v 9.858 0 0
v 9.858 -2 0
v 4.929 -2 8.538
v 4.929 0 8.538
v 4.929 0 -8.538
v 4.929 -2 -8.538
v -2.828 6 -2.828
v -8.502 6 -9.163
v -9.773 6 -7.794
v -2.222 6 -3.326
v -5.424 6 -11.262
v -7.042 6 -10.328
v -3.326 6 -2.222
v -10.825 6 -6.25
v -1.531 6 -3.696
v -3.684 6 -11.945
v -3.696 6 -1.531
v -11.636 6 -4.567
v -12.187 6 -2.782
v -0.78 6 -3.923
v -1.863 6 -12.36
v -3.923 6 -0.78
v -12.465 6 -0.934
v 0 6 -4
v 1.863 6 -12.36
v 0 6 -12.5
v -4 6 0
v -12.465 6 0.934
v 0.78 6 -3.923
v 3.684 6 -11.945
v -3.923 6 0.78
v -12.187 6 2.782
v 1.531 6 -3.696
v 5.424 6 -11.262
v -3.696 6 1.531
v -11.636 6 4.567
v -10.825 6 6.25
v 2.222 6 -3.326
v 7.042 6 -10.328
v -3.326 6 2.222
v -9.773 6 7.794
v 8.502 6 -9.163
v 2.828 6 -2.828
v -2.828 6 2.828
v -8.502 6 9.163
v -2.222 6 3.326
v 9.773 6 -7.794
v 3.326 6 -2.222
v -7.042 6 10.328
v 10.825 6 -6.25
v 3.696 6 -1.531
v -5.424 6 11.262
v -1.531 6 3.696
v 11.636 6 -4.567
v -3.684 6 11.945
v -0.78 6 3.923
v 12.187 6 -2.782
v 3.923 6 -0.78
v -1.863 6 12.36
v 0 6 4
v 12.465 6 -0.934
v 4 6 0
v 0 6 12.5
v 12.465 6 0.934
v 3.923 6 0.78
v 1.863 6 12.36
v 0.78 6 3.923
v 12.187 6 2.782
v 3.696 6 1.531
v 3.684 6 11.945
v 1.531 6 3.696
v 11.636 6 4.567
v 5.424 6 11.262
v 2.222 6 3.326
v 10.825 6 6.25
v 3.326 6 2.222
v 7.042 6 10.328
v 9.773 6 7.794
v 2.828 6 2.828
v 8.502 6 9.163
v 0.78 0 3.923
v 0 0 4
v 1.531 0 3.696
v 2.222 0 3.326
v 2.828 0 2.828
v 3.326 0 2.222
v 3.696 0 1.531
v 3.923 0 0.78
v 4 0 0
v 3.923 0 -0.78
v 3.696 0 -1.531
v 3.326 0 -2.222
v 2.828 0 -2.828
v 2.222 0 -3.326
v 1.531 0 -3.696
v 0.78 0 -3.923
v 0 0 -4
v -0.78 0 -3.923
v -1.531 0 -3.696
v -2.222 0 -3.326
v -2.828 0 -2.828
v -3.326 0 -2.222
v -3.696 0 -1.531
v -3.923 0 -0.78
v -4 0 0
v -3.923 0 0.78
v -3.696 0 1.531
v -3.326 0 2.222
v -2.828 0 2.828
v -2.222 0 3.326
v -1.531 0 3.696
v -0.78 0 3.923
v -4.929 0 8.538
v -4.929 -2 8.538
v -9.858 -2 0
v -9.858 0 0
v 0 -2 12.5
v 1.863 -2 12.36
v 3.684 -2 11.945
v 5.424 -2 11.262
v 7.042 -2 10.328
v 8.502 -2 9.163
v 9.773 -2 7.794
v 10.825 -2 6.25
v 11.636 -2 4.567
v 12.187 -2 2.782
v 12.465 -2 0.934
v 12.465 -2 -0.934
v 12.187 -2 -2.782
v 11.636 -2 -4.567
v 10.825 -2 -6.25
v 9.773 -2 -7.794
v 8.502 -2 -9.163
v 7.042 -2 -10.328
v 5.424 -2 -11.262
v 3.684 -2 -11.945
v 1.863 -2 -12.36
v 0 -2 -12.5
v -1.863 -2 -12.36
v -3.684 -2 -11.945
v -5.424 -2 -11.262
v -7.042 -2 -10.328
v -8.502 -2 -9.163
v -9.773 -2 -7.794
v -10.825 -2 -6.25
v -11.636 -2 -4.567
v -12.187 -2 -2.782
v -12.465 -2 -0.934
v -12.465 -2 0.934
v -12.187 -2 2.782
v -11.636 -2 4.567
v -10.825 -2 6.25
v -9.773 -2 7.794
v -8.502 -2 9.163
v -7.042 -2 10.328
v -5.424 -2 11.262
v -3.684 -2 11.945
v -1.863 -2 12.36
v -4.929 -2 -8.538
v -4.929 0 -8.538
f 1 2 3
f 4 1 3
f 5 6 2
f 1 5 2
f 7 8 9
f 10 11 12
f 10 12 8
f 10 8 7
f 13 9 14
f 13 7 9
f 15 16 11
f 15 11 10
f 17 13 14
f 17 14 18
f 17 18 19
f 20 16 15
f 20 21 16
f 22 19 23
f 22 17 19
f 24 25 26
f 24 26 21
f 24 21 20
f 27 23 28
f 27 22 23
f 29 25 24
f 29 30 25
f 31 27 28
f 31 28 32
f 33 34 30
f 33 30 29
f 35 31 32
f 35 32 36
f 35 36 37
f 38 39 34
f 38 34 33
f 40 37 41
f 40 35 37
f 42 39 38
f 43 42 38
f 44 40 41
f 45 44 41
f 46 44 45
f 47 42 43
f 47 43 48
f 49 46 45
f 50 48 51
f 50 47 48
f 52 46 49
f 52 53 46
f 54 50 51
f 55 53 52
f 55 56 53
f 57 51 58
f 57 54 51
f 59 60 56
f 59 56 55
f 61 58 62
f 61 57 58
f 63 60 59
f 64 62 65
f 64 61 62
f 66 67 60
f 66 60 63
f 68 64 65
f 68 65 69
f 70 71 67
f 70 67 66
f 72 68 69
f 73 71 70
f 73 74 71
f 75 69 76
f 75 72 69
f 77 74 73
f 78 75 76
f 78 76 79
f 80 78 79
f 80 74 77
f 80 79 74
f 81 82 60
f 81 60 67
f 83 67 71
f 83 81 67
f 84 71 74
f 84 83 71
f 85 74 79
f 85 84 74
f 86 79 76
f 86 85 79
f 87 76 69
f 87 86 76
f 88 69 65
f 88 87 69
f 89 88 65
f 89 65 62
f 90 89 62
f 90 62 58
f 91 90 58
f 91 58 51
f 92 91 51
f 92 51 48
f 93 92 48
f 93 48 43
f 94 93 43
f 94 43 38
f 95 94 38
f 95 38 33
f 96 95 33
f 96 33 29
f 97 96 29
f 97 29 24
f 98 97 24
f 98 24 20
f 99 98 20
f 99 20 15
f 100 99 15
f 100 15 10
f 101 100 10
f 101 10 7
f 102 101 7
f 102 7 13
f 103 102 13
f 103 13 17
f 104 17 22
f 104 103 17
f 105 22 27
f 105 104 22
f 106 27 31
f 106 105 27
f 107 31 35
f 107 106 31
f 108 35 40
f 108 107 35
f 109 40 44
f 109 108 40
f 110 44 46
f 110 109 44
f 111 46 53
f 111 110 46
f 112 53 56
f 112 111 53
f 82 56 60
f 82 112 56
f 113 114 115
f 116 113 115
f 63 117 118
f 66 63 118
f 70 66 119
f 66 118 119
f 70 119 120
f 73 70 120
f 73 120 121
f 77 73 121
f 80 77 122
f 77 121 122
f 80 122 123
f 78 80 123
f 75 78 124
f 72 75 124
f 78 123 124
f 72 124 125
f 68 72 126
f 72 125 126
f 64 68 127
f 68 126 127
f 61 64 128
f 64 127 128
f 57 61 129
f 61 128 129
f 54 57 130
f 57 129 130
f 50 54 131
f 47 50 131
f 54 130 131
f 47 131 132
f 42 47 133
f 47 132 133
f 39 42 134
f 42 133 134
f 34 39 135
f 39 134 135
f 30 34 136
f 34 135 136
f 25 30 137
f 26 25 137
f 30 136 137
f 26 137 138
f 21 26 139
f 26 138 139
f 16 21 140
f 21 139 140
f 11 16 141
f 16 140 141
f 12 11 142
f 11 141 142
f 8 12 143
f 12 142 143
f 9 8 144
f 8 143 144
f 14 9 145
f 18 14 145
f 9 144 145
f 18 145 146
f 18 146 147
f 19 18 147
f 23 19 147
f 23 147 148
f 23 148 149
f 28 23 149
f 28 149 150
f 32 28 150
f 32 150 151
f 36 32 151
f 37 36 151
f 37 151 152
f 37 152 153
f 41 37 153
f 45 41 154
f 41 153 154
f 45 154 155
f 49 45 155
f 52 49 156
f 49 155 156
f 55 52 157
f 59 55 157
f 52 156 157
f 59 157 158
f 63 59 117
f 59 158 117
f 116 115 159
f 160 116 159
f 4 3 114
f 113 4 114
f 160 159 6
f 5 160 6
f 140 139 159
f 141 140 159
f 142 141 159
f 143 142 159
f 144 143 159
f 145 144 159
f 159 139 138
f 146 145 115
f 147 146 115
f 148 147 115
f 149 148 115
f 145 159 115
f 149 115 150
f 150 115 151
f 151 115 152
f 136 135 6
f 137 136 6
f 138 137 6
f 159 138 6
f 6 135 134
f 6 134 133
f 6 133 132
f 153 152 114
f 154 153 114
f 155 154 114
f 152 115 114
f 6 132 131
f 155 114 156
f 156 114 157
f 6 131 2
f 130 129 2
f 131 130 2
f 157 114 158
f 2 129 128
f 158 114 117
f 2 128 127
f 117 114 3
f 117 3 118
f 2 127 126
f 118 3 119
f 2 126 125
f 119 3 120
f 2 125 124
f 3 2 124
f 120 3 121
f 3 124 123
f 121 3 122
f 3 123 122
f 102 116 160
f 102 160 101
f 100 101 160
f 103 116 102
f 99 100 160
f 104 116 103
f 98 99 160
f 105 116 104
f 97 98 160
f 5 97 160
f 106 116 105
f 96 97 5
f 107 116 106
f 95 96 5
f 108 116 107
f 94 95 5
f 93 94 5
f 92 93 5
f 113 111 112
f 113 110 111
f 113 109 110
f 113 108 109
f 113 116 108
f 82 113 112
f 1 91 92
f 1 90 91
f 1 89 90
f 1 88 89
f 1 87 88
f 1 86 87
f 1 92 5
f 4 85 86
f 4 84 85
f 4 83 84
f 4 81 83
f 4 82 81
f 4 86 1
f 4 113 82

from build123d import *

# Parameters (mm, degrees)
BOSS_EXTRUDE1_DEPTH      = 6
BOSS_EXTRUDE1_DEPTH_BACK = 2
SKETCH1_R                = 12.5
SKETCH1_R_2              = 4
CUT_EXTRUDE1_DEPTH       = 2


with BuildPart() as part:
    # Sketch1 → Boss-Extrude1 (new, two sides: drawn at the far end of the back side and taken through both)
    with BuildSketch(Plane(origin=(0, 0, 0), x_dir=(1, 0, 0), z_dir=(0, 1, 0)).offset(-BOSS_EXTRUDE1_DEPTH_BACK)):
        with Locations(Location((0, 0, 0), (0, 0, 270))):
            Circle(SKETCH1_R)
        with Locations(Location((0, 0, 0), (0, 0, 270))):
            Circle(SKETCH1_R_2, mode=Mode.SUBTRACT)
    extrude(amount=BOSS_EXTRUDE1_DEPTH + BOSS_EXTRUDE1_DEPTH_BACK)

    # Sketch2 → Cut-Extrude1 (cut)
    with BuildSketch(Plane.XZ.offset(2)):
        Polygon((9.85829335, 0), (4.929146675, 8.537532479), (-4.929146675, 8.537532479), (-9.85829335, 0), (-4.929146675, -8.537532479), (4.929146675, -8.537532479), align=None)
    extrude(amount=-CUT_EXTRUDE1_DEPTH, mode=Mode.SUBTRACT)


solid = part.part
